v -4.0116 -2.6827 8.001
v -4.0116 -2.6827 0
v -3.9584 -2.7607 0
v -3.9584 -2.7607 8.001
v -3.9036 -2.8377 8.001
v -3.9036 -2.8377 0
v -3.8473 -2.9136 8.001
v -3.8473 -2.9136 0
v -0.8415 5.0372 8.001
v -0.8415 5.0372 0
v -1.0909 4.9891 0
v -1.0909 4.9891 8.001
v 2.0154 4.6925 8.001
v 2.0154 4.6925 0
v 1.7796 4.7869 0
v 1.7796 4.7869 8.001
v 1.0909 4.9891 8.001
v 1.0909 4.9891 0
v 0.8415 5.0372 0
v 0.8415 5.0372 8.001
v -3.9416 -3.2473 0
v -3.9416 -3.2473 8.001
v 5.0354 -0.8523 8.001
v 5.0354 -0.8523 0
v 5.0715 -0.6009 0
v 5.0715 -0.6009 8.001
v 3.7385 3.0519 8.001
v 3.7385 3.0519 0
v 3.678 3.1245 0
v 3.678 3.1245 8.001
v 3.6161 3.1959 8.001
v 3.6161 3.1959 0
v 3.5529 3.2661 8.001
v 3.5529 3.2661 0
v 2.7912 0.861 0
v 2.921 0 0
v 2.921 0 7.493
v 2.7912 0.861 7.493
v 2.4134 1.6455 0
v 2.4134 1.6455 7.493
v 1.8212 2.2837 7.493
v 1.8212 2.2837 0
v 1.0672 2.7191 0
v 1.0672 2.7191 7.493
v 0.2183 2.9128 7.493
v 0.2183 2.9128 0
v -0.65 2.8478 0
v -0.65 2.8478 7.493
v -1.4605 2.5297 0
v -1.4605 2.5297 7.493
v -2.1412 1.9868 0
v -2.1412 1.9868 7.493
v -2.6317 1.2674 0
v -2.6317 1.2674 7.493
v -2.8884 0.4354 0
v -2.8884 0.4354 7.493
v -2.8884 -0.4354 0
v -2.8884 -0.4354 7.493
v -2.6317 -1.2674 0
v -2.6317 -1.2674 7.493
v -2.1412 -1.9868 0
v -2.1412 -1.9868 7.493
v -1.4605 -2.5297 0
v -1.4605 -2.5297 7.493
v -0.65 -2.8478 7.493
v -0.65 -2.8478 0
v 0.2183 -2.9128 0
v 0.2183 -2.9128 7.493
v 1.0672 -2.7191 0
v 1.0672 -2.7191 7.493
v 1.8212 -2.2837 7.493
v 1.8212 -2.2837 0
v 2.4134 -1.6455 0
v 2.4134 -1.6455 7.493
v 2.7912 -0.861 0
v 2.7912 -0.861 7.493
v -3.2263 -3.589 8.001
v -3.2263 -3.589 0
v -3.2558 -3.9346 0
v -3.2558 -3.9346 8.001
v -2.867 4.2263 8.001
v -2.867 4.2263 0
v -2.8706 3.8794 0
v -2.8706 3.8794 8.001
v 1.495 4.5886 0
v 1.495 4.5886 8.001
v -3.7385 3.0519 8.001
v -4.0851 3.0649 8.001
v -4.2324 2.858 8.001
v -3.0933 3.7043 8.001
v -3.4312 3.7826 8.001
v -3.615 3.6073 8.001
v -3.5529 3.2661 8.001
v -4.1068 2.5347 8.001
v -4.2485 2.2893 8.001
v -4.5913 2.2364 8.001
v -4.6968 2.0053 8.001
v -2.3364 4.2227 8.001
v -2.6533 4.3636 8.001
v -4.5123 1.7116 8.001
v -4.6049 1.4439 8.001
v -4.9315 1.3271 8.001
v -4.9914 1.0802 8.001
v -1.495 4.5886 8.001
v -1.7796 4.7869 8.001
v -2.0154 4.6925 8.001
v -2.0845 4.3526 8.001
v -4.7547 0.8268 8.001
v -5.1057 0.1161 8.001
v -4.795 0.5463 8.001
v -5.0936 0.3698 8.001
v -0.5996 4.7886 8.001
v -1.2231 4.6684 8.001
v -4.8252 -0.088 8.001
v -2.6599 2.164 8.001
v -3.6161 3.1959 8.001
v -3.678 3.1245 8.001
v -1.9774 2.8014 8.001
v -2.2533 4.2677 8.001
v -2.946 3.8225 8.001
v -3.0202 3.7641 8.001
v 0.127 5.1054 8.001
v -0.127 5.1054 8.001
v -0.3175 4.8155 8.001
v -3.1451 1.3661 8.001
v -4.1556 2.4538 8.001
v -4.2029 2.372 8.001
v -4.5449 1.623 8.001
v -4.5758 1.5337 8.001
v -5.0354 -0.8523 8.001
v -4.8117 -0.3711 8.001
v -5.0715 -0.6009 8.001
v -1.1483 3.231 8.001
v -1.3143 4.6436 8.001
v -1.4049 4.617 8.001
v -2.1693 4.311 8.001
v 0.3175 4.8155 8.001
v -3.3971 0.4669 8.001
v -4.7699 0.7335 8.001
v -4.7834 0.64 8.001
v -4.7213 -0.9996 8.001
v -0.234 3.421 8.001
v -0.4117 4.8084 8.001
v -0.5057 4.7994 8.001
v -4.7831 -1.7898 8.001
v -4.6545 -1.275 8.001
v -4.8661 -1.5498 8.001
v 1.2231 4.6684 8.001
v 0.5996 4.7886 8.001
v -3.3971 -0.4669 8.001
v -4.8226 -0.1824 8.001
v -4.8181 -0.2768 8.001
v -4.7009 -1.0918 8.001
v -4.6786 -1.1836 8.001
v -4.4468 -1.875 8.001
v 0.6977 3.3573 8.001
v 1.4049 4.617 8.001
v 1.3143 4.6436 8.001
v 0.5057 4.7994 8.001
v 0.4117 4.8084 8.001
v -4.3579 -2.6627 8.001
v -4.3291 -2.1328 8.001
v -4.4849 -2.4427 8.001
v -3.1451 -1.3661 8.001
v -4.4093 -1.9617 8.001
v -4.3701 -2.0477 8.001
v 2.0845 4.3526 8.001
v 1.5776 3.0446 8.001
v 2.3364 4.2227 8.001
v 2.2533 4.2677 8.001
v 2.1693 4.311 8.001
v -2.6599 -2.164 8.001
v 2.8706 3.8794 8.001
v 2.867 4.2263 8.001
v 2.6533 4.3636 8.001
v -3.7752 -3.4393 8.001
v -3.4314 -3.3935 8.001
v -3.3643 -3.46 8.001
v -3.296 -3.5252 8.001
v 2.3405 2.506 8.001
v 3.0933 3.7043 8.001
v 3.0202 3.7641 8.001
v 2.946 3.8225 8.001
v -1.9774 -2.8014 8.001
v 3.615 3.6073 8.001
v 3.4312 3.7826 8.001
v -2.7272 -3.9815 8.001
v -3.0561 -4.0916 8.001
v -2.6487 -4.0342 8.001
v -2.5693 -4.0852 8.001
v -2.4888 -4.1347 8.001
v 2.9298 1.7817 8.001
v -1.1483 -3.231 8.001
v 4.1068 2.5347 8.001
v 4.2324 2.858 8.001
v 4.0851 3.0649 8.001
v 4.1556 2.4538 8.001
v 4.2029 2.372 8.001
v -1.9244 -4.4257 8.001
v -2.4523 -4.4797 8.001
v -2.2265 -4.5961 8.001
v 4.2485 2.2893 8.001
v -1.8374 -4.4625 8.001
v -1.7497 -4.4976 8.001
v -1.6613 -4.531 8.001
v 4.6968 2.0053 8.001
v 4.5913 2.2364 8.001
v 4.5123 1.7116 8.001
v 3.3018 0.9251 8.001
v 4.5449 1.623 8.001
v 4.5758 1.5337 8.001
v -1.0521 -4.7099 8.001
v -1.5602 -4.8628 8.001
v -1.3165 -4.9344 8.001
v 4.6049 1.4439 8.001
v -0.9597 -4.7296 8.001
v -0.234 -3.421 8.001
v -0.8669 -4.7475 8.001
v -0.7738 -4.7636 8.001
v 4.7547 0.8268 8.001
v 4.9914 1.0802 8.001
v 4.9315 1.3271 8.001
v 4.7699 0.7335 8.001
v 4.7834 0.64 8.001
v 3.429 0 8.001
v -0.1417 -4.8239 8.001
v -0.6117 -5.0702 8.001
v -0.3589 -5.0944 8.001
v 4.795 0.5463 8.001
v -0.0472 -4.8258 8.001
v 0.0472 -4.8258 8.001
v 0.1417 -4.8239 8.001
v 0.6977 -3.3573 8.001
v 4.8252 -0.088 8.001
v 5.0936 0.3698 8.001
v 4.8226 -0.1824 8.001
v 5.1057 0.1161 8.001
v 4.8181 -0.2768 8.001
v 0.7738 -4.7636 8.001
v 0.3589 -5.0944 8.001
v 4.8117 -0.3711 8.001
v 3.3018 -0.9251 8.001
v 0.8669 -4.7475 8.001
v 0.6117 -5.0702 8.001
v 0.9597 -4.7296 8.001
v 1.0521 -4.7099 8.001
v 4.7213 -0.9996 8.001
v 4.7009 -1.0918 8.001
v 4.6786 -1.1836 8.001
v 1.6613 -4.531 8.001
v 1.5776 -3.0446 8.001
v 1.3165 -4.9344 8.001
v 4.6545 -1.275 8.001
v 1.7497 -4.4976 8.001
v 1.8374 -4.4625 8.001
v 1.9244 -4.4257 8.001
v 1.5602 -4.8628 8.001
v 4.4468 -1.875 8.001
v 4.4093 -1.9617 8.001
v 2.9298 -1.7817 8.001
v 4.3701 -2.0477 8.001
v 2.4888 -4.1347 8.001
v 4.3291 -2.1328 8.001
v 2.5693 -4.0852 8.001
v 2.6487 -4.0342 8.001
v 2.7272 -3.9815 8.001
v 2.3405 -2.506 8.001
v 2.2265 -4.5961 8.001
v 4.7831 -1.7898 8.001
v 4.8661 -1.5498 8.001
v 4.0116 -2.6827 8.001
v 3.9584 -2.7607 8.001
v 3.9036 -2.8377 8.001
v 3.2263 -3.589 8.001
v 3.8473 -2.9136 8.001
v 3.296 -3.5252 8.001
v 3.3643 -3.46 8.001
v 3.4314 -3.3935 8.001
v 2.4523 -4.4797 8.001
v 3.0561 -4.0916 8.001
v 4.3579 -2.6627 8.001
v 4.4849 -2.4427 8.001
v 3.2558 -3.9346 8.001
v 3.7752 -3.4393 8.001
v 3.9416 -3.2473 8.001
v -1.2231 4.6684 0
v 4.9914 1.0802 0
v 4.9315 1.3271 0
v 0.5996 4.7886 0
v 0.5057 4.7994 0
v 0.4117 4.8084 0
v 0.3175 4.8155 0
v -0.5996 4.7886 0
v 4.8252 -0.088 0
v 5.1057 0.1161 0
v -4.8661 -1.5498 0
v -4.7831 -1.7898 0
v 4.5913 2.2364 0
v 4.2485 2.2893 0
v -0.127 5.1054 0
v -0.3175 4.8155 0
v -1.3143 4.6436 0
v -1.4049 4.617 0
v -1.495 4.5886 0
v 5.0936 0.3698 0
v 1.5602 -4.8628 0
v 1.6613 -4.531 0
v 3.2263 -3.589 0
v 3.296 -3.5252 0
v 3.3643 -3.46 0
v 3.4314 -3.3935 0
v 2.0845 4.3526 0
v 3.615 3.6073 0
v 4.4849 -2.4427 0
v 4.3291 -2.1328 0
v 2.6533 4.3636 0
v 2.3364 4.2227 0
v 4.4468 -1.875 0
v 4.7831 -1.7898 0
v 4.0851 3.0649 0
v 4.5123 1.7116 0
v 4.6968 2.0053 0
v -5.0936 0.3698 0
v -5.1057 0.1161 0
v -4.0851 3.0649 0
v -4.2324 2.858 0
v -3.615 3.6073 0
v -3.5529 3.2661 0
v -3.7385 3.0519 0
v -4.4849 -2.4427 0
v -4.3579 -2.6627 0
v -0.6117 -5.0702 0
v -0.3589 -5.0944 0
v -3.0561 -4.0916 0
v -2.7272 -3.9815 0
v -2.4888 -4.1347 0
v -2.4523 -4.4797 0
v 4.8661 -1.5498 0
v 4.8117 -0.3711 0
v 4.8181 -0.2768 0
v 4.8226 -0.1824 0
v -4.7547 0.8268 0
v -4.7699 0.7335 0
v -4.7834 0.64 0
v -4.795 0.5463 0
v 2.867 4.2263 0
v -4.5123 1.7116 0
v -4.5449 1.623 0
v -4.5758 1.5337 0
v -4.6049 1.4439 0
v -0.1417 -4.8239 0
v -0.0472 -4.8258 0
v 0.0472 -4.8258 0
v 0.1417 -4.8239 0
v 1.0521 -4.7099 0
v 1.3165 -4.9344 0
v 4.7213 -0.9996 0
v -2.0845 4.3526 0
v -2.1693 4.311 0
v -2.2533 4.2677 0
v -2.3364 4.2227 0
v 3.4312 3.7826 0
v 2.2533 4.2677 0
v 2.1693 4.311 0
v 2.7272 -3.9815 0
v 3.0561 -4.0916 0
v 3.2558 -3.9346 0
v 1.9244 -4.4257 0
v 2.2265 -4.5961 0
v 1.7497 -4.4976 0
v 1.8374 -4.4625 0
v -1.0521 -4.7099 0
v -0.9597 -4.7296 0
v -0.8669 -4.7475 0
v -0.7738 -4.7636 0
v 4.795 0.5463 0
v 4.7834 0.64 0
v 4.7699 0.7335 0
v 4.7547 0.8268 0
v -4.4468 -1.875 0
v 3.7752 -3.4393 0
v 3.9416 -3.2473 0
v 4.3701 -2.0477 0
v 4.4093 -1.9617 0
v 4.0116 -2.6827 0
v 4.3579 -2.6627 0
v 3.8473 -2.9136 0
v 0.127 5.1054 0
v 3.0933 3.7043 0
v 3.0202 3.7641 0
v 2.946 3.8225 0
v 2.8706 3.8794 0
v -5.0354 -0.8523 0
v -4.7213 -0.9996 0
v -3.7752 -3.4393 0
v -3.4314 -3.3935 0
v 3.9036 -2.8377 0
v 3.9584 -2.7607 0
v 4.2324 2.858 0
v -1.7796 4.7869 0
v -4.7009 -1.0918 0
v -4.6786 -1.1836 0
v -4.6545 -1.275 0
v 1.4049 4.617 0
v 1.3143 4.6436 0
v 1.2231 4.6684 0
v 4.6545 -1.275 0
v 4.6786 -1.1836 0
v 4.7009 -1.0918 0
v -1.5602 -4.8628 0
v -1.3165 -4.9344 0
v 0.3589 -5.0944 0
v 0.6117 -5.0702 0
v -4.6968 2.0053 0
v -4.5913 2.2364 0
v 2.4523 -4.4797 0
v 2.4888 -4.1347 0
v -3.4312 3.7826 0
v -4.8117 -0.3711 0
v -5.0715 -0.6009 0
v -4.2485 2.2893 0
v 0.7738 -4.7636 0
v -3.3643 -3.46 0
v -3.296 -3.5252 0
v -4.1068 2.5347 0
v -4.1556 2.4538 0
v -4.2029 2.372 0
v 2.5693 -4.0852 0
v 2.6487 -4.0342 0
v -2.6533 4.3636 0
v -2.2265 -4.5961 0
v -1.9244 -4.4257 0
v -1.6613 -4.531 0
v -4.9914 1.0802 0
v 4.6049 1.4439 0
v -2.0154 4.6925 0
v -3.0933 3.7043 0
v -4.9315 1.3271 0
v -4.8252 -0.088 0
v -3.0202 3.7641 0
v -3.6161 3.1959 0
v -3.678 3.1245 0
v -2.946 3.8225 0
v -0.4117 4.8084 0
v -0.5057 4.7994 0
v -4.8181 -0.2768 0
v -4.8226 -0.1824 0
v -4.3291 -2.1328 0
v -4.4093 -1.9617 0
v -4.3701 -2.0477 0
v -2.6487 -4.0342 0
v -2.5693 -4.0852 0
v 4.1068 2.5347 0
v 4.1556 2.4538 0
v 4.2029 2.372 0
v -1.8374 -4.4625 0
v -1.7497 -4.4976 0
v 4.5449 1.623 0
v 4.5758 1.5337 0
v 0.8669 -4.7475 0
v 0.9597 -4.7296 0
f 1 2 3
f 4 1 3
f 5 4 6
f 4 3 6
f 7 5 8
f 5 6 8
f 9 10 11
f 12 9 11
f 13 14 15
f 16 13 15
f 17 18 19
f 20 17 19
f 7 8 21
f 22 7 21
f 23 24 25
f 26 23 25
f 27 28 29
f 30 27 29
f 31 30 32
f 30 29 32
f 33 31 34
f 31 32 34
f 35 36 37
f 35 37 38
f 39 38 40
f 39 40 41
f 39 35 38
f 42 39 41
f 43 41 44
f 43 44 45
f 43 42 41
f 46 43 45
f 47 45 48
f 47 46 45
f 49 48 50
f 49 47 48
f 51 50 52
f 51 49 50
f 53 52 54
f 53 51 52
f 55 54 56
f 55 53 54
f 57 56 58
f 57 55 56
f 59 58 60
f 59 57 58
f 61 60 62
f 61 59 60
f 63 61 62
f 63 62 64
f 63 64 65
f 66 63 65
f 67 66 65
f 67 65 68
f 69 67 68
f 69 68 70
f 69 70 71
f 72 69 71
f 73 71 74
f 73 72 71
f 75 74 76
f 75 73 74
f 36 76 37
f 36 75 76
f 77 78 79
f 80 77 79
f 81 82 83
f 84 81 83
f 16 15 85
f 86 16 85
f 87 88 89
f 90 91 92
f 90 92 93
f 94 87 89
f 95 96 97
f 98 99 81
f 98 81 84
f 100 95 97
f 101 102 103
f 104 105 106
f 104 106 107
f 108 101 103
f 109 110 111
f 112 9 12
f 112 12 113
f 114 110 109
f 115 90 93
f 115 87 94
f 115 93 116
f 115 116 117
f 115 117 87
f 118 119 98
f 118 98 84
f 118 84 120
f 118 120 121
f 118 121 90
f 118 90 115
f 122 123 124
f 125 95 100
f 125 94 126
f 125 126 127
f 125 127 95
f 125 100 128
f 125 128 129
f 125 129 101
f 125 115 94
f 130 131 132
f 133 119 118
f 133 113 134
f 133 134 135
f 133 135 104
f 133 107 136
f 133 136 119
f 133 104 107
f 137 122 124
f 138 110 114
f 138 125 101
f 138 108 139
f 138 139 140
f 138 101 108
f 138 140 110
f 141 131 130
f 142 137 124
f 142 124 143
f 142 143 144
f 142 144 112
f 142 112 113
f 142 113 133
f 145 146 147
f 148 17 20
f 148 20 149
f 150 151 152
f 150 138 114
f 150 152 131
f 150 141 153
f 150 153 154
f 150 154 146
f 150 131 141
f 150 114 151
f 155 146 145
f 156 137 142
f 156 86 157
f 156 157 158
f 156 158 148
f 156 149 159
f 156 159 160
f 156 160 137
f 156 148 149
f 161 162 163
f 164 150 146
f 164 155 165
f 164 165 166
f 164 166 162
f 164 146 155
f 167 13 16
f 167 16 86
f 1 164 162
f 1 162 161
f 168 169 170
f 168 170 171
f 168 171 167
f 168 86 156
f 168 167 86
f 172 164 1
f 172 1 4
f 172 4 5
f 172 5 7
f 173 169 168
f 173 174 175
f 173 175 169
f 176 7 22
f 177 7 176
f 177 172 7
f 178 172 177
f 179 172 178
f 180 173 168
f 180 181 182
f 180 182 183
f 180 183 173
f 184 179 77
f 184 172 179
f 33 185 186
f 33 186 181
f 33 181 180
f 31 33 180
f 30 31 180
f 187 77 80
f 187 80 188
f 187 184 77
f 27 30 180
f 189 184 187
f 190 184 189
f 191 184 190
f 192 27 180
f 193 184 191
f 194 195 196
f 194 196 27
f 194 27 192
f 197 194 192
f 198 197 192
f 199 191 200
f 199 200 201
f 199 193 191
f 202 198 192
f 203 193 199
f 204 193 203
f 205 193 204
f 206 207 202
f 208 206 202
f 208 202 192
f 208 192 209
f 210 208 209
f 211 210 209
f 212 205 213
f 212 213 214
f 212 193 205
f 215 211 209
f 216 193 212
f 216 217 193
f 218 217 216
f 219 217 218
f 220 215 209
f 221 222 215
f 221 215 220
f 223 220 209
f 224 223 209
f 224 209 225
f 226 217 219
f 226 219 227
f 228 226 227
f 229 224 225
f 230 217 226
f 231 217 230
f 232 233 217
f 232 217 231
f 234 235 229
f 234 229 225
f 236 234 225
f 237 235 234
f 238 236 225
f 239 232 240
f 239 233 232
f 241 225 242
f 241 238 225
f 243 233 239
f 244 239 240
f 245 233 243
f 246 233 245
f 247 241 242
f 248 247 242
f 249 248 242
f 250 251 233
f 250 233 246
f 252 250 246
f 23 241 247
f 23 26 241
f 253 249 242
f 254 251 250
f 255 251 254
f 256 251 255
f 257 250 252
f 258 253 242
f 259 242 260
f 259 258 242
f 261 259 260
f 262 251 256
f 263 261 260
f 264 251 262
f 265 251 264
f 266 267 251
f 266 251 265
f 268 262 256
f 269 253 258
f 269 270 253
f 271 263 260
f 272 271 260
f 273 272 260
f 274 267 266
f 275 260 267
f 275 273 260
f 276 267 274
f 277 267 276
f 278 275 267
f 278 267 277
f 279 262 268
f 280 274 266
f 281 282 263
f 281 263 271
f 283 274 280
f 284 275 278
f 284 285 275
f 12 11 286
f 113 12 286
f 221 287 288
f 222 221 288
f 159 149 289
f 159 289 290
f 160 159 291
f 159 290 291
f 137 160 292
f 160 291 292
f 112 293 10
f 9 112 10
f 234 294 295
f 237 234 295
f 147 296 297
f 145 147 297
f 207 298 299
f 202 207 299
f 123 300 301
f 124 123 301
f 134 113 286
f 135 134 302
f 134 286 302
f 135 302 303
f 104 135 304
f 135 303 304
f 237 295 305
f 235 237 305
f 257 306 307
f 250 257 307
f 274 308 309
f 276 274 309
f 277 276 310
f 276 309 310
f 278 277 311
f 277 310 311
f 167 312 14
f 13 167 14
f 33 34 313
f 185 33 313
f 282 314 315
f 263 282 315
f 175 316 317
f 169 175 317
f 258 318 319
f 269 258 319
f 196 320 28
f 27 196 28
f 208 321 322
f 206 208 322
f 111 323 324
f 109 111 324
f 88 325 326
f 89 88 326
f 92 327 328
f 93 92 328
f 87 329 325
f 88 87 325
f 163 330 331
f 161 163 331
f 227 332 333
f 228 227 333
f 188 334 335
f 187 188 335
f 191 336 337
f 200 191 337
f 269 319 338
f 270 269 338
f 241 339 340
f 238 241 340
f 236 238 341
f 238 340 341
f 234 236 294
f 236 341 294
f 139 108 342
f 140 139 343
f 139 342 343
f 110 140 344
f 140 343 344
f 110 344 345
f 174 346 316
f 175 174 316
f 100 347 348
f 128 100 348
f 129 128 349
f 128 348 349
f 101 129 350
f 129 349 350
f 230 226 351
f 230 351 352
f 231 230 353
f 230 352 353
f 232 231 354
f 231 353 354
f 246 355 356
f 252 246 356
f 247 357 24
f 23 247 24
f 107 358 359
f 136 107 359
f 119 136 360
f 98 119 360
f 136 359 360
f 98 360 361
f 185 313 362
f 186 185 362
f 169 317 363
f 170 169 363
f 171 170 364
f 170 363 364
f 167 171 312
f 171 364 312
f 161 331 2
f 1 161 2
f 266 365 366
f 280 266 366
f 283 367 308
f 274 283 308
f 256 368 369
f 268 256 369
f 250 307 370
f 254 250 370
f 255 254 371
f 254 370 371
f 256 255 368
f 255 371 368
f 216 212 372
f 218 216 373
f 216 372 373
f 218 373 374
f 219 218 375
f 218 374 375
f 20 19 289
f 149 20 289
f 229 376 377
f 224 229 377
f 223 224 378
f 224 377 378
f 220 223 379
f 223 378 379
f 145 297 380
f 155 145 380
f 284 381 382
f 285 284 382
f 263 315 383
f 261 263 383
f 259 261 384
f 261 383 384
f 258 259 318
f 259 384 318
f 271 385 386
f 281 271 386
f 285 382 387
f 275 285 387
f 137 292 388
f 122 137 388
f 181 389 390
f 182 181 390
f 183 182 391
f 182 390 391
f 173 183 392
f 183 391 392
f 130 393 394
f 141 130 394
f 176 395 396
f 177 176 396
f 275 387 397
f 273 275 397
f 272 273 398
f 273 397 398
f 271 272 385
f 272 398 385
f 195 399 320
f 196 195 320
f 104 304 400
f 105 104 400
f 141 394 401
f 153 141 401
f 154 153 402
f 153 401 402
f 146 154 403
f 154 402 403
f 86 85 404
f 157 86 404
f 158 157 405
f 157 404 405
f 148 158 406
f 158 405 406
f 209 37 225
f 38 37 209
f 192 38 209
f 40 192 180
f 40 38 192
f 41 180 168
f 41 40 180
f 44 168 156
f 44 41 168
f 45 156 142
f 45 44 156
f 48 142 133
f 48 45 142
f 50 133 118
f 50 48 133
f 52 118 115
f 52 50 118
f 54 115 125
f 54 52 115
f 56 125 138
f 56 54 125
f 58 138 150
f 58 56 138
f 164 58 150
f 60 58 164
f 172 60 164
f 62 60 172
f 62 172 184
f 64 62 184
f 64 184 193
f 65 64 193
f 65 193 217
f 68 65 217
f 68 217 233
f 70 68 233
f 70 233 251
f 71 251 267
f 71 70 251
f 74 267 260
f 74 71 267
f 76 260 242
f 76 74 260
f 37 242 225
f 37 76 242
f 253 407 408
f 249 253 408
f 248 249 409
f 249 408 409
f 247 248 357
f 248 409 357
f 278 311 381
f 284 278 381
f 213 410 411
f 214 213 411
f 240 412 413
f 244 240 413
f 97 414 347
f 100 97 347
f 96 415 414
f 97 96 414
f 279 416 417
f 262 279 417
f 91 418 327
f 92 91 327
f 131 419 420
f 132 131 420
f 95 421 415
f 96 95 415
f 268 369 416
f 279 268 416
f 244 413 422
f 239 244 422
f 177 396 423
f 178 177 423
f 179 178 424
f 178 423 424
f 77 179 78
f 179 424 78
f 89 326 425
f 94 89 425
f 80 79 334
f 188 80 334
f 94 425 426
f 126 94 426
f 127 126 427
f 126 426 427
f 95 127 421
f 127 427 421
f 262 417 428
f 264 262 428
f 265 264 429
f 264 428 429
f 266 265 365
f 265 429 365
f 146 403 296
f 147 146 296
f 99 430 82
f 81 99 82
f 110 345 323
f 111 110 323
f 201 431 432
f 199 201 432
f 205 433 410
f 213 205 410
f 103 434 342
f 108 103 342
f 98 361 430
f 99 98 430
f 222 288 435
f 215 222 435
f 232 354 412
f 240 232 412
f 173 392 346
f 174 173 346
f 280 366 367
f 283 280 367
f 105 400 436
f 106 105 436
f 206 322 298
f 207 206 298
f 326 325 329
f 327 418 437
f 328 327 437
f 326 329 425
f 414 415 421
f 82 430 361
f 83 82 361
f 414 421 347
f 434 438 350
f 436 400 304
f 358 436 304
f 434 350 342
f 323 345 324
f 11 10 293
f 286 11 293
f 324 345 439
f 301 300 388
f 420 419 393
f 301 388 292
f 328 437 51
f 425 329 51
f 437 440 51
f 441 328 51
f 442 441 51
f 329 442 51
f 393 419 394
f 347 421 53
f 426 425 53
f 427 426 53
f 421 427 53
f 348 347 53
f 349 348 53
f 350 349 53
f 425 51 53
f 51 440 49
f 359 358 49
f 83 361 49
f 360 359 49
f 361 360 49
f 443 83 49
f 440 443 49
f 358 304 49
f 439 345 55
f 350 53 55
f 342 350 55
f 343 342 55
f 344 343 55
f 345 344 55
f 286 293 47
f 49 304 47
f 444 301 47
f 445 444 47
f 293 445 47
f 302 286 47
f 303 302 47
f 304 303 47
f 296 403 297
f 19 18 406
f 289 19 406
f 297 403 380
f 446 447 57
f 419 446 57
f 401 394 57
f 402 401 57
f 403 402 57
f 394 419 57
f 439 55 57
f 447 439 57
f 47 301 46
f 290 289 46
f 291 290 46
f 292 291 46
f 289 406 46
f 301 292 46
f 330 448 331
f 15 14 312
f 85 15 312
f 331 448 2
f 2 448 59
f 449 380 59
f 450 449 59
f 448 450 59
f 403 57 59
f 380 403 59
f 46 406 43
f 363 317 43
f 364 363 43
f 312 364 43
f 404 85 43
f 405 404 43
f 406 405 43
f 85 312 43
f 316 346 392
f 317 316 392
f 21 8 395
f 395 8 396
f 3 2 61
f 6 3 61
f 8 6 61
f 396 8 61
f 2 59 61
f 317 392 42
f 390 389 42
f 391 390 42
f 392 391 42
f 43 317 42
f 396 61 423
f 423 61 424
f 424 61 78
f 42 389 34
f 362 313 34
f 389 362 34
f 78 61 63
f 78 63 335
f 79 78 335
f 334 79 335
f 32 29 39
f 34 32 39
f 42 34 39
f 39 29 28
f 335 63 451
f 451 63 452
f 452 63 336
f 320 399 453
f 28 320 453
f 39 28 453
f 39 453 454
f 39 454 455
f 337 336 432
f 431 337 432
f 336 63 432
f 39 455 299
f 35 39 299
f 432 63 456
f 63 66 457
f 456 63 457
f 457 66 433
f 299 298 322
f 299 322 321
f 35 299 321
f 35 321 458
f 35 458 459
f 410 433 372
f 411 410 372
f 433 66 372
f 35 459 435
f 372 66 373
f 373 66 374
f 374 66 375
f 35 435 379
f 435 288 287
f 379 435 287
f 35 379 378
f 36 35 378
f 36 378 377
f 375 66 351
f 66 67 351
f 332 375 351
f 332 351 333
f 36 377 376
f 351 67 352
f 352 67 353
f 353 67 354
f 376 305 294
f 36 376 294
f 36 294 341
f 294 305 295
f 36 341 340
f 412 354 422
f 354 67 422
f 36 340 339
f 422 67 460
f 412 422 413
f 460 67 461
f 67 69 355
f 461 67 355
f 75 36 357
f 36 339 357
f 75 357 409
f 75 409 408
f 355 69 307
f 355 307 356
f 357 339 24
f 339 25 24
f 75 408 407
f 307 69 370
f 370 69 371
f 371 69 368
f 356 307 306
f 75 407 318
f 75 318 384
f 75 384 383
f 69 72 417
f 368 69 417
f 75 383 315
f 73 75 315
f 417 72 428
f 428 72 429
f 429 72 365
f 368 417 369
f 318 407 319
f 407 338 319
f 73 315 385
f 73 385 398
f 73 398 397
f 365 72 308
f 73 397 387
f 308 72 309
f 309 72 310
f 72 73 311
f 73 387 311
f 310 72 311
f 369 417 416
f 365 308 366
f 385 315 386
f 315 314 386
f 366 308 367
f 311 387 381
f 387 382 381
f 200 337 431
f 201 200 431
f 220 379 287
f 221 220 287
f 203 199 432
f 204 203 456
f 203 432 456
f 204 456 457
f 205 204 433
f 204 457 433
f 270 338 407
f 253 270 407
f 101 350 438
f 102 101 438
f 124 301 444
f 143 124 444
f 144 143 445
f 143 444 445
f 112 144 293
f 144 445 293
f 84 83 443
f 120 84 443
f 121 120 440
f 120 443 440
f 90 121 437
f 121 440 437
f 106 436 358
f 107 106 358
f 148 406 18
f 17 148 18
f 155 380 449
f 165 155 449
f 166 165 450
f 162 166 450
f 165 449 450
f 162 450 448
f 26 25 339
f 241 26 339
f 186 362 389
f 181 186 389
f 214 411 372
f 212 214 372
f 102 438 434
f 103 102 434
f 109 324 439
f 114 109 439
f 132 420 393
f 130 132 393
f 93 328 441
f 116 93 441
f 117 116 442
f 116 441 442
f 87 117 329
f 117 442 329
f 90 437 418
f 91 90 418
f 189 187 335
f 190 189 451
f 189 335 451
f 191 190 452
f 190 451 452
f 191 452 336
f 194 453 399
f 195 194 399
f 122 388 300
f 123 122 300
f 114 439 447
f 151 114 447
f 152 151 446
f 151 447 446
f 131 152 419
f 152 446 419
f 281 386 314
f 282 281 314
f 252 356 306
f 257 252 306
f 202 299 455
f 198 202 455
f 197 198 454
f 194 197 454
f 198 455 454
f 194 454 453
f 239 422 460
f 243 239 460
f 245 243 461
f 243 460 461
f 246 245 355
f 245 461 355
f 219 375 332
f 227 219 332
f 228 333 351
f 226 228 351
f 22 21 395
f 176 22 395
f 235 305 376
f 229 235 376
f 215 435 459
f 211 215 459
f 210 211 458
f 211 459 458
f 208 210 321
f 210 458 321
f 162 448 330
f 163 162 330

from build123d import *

# Parameters (mm, degrees)
F0_R            = 2.921
F1_DEPTH        = 8.001
F2_DEPTH        = 8.001
F2_COPIES_COUNT = 33
F3_SIZE         = 0.508


# Not quite as in the source:
# - a pattern or mirror of a feature is missing from the dataset's text; its kind, count and spacing are read off the source's solid


with BuildPart() as f1:
    # F0 (on Top) → F1 (new body)
    with BuildSketch(Plane.XY):
        with BuildLine():
            ThreePointArc((-0.3175, 4.8155445954), (-3.298334504, -3.5229626027), (4.826, 0))
            ThreePointArc((4.826, 0), (3.5229626027, 3.298334504), (0.3175, 4.8155445954))
            ThreePointArc((0.3175, 4.8155445954), (0, 4.826), (-0.3175, 4.8155445954))
        make_face()
        Circle(F0_R, mode=Mode.SUBTRACT)
    extrude(amount=F1_DEPTH)

    # F0 (on Top) → F2 (join, through all)
    with BuildSketch(Plane.XY):
        with BuildLine():
            ThreePointArc((-0.3175, 4.8155445954), (0, 4.826), (0.3175, 4.8155445954))
            Line((0.3175, 4.8155445954), (0.127, 5.1054))
            Line((0.127, 5.1054), (-0.127, 5.1054))
            Line((-0.127, 5.1054), (-0.3175, 4.8155445954))
        make_face()
    f2 = extrude(amount=F2_DEPTH)

    # F2_copies: F2 ×33 about axis
    f2_copies_axis = Axis((0, 0, 0), (0, 0, 1))
    for i in range(1, F2_COPIES_COUNT):
        add(f2.rotate(f2_copies_axis, i * 360 / F2_COPIES_COUNT))

    # F3
    f3_edges = [f1.edges().sort_by_distance(p)[0] for p in [
        (-2.921, 0, 8.001),
    ]]
    chamfer(f3_edges, length=F3_SIZE)


solid = f1.part
